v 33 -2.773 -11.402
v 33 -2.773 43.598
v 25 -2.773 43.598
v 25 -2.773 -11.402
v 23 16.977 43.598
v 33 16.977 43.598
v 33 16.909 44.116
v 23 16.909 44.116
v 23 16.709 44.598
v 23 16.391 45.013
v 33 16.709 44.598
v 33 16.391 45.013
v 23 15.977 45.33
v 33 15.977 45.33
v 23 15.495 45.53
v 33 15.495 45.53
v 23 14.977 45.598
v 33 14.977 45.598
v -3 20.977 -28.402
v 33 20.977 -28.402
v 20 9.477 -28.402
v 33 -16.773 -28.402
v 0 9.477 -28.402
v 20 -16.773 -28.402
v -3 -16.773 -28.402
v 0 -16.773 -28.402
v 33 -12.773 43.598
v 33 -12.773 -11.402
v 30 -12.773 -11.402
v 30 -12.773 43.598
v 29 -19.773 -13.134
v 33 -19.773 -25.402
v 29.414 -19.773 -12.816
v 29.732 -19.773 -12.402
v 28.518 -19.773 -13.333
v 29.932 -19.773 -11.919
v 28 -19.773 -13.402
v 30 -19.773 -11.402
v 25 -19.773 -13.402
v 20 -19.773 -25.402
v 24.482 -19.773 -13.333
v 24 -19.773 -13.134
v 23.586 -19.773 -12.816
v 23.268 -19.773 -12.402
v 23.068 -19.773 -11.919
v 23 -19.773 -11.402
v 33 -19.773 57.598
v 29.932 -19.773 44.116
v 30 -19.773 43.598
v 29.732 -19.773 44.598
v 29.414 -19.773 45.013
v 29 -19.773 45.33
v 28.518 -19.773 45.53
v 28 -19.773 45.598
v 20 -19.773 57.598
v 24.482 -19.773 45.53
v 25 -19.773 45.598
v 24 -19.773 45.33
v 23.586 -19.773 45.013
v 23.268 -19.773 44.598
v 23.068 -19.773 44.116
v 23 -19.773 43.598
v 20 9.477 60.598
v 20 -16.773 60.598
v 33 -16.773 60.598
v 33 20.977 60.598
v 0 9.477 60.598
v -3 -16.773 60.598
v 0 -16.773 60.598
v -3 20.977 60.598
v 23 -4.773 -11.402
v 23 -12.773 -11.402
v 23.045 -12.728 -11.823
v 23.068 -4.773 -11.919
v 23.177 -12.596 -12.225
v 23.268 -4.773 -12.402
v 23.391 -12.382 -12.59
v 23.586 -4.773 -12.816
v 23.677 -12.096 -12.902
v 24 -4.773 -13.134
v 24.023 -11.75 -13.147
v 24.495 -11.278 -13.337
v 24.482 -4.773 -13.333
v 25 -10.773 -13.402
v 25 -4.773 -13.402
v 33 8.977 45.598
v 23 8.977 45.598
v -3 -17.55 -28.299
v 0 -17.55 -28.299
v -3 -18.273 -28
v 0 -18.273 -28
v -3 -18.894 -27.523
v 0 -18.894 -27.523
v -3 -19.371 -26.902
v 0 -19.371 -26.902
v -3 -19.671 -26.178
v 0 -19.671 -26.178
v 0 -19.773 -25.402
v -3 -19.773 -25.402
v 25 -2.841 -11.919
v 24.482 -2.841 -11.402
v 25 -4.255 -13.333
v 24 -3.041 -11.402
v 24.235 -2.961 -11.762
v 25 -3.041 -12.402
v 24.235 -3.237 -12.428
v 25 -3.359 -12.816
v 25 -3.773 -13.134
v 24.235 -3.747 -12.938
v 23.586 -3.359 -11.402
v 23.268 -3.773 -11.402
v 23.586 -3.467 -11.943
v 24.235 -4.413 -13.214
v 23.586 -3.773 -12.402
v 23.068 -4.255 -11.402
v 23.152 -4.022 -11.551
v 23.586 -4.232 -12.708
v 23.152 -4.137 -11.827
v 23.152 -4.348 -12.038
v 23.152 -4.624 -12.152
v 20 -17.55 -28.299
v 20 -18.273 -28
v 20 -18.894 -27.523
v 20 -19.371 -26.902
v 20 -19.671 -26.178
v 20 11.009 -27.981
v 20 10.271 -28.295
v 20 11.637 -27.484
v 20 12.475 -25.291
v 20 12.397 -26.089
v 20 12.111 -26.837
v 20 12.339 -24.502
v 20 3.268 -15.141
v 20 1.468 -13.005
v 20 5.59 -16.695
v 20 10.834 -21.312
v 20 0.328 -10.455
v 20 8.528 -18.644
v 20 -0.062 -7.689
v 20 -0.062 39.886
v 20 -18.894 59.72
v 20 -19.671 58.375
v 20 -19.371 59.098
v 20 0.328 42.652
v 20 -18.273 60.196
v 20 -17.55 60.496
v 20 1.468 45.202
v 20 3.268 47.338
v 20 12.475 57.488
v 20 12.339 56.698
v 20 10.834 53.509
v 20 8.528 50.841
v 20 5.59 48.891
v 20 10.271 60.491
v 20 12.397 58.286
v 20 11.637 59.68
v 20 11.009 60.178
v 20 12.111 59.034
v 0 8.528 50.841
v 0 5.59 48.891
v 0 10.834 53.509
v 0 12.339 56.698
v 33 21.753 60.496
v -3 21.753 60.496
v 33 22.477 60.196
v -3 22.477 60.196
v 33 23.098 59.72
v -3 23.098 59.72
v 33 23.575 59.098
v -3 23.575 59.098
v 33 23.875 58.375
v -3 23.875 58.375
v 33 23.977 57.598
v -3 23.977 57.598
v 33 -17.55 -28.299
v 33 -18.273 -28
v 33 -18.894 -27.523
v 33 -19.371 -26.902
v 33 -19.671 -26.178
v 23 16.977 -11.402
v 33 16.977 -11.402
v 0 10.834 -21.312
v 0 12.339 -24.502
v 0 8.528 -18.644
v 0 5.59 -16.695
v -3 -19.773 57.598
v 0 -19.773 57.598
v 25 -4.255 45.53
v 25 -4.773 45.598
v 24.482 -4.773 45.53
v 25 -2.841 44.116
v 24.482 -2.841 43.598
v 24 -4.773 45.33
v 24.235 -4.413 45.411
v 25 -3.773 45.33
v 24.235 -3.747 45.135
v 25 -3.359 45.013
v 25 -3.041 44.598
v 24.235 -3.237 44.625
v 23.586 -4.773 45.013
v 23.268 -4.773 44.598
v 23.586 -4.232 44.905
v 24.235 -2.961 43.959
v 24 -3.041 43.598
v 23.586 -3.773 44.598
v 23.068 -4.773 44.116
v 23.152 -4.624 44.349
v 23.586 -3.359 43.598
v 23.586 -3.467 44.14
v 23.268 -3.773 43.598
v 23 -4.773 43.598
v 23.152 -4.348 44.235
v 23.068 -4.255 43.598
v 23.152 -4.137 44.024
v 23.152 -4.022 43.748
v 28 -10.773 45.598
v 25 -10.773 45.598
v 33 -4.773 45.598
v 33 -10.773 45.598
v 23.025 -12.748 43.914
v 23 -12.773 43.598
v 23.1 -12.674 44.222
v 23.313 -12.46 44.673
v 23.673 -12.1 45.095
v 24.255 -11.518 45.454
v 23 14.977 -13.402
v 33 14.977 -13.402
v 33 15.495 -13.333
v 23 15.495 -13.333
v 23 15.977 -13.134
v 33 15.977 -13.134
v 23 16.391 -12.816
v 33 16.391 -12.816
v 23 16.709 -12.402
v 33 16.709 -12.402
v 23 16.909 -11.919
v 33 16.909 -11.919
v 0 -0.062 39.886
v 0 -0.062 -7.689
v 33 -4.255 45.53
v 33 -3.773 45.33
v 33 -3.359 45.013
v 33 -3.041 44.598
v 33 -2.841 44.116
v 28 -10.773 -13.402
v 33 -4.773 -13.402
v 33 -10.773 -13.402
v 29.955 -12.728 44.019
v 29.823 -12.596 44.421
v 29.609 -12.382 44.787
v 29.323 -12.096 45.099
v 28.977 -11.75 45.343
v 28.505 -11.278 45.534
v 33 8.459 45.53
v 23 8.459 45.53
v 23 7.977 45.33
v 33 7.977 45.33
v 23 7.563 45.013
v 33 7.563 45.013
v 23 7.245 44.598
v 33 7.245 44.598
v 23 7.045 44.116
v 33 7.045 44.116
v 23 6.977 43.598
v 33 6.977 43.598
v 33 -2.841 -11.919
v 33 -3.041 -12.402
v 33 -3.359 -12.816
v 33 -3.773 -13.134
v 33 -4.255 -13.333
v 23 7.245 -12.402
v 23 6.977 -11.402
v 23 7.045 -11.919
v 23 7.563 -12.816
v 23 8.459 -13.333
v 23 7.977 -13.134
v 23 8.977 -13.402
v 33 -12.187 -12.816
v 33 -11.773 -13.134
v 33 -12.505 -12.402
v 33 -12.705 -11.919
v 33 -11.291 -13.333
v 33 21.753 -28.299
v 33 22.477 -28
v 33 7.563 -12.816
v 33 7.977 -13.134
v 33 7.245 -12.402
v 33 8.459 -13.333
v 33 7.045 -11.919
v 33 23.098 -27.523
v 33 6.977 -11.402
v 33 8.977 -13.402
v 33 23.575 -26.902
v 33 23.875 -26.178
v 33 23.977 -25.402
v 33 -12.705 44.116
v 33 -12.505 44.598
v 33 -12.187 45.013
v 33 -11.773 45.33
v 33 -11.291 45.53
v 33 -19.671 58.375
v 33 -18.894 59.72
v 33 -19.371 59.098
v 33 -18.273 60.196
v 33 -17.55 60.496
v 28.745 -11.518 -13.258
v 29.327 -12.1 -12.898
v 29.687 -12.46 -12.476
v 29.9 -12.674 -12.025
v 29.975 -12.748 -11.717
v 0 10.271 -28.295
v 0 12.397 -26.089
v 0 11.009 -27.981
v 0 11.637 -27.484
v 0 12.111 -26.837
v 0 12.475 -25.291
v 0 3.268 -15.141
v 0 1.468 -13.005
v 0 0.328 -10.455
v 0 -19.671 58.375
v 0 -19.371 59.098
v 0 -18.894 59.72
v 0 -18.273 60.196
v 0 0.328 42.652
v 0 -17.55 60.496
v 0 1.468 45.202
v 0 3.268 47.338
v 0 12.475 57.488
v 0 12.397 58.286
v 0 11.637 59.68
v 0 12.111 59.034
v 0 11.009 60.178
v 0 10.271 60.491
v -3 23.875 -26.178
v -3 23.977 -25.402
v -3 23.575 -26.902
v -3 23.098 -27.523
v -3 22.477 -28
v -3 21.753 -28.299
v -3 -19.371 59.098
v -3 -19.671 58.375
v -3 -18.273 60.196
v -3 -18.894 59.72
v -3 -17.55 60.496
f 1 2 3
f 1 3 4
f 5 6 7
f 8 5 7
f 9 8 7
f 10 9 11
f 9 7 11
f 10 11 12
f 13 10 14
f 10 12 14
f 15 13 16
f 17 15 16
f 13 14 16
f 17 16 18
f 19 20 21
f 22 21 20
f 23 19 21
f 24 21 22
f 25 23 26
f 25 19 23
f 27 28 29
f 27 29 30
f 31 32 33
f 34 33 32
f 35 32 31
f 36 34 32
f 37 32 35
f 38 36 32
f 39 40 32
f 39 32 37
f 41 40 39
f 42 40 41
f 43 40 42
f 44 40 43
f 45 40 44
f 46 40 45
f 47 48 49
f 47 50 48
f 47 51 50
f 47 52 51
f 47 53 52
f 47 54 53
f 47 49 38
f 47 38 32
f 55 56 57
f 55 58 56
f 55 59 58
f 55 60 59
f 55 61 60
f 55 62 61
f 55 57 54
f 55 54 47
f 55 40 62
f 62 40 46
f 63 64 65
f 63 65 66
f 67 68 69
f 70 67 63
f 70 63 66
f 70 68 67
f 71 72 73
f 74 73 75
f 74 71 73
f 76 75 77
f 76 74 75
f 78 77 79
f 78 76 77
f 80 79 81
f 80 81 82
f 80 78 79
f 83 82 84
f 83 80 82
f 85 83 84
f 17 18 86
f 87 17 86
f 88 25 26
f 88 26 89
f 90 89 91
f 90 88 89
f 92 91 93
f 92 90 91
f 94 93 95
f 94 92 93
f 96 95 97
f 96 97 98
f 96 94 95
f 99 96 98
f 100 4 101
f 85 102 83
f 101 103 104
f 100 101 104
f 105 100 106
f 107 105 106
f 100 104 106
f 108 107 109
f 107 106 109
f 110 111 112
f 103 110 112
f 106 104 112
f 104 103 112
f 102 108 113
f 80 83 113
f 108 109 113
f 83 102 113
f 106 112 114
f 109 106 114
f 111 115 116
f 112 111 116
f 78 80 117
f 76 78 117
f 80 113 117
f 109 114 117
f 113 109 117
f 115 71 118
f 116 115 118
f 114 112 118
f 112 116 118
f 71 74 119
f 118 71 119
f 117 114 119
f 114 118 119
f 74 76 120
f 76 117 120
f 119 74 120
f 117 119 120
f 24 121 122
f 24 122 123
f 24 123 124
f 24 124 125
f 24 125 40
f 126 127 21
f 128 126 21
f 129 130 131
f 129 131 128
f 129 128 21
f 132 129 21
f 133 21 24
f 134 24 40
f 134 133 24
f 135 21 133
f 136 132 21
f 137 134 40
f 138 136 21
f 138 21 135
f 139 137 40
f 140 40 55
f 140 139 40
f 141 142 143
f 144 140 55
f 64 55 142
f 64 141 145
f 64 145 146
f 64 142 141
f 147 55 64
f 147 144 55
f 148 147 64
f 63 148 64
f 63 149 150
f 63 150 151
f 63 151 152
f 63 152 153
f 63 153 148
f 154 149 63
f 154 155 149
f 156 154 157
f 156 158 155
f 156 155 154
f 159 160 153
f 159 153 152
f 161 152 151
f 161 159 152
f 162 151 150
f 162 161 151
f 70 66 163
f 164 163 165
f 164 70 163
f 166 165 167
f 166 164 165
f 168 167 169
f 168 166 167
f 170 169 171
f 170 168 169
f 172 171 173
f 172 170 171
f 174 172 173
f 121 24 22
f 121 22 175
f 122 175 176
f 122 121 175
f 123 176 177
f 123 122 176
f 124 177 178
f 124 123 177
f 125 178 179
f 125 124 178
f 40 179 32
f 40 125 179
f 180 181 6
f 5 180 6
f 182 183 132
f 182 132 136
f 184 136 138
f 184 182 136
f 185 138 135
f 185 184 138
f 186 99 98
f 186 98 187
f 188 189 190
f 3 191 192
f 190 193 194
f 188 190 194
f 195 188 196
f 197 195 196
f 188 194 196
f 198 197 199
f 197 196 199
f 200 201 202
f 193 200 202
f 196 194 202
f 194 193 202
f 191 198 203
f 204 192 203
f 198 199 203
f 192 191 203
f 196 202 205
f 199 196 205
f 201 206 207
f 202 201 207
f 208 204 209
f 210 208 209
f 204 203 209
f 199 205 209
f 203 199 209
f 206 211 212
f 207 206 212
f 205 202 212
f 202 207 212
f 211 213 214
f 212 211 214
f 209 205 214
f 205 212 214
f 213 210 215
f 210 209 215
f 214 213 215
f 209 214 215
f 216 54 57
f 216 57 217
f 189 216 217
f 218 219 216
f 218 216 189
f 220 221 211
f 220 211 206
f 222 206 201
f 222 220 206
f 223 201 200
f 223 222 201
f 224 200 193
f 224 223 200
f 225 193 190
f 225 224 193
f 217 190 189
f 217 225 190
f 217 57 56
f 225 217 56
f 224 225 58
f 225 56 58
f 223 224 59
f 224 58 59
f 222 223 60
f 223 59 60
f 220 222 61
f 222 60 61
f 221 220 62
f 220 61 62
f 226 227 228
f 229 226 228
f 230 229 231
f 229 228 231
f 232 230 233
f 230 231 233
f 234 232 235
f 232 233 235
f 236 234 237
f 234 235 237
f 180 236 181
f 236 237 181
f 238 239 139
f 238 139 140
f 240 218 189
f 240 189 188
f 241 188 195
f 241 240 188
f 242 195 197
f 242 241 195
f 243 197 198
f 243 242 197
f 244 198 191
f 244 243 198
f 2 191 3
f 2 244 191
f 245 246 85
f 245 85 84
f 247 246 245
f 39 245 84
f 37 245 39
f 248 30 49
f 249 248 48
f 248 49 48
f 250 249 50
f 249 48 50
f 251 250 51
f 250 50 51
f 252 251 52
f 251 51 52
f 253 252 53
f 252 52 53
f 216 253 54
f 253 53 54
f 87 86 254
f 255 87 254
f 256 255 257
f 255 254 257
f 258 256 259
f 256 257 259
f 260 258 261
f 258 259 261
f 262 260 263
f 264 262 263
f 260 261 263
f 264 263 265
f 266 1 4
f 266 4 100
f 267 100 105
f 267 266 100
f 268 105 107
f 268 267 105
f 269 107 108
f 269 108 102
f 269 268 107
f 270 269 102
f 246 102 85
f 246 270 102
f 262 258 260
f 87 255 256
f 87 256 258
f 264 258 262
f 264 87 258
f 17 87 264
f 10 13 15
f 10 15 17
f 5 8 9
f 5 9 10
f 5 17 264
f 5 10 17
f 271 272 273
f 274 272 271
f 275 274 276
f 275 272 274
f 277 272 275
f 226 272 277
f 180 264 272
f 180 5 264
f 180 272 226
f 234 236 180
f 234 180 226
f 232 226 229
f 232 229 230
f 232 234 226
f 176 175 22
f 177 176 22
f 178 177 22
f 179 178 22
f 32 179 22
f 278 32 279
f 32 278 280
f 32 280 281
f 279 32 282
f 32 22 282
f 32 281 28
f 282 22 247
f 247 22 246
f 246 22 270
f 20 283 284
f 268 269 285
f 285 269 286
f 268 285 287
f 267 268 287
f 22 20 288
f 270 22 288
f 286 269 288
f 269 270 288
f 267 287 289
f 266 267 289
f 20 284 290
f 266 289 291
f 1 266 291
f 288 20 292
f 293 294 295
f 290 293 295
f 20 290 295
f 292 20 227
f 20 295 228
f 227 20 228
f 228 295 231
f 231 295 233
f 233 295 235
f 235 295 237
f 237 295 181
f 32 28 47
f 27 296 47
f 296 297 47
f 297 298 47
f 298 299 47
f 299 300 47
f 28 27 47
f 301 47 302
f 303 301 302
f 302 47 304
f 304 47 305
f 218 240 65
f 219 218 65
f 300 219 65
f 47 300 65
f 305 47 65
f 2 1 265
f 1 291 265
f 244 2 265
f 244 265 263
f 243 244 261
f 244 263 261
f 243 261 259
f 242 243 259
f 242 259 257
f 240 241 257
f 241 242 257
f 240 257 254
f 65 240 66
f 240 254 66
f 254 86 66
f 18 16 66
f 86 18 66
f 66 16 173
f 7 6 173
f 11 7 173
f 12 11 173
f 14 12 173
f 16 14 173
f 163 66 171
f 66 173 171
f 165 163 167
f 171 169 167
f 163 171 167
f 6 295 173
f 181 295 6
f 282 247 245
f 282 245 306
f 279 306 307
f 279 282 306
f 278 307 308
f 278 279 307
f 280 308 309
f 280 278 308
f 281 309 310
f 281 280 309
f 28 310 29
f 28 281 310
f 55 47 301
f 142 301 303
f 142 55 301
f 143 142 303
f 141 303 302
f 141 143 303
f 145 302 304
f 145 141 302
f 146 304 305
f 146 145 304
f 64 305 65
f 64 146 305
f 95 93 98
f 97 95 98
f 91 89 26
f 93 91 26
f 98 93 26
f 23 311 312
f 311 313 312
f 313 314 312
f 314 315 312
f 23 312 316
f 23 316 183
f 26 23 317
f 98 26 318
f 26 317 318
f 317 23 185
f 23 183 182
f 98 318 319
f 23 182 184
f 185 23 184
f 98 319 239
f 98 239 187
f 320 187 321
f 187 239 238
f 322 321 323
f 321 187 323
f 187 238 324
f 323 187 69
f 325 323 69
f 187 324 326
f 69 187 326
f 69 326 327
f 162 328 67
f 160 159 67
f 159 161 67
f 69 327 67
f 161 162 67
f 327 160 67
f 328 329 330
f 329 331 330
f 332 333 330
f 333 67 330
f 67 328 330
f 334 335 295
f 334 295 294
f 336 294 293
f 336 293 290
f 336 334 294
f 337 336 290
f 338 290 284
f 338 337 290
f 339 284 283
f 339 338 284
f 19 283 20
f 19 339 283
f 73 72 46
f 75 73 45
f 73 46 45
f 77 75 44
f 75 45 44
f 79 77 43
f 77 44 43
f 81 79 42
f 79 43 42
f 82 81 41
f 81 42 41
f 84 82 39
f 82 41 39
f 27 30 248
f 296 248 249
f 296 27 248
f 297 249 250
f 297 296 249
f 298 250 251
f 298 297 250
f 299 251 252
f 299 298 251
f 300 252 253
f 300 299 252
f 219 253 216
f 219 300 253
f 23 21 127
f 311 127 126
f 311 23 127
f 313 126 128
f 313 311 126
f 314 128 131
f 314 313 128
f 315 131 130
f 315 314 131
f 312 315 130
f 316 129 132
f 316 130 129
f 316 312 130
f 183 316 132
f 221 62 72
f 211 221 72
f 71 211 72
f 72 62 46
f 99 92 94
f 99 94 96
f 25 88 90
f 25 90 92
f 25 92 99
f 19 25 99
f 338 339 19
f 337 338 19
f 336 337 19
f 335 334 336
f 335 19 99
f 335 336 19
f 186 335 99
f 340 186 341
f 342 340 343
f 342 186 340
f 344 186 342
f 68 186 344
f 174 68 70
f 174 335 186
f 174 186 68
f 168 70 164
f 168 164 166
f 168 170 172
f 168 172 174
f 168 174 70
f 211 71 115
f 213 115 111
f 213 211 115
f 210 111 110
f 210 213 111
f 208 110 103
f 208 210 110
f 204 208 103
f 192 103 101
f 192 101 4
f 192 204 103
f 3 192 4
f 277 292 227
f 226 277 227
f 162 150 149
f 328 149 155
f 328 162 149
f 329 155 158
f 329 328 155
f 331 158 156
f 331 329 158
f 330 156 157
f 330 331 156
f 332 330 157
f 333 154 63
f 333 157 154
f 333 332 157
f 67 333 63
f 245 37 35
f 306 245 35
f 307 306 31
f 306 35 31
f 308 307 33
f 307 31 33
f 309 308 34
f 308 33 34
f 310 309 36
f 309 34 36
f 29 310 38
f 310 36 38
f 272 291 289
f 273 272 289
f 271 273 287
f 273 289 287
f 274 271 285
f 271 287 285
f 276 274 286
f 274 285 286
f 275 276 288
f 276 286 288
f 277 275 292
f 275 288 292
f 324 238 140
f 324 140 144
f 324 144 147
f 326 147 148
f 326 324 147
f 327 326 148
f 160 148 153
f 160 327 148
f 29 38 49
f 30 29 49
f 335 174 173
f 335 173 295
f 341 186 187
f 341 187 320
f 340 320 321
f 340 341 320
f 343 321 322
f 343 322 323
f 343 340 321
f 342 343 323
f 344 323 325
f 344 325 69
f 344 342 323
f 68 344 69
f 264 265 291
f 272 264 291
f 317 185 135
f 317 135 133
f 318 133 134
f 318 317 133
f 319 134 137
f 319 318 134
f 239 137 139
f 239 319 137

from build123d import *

# Parameters (mm, degrees)
RESSALTO_EXTRUS_O2_DEPTH      = 30
RESSALTO_EXTRUS_O3_START      = 3
RESSALTO_EXTRUS_O3_DEPTH      = 3
RESSALTO_EXTRUS_O4_DEPTH      = 3
RESSALTO_EXTRUS_O4_DEPTH_BACK = 10
CORTE_EXTRUS_O1_DEPTH         = 10.000000000000002
CORTE_EXTRUS_O2_REACH         = 83.702
FILETE1_R                     = 2


with BuildPart() as part:
    # Esboço2 → Ressalto-extrusão2 (new body)
    with BuildSketch(Plane(origin=(0, 0, 0), x_dir=(0, 0, -1), z_dir=(1, 0, 0))):
        with BuildLine():
            Line((2.901599919865161, -0.06246593766177921), (-35.09840008013481, -0.06246593766176534))
            Line((-35.09840008013481, -0.06246593766176534), (-39.886084902926825, -0.06246593766177921))
            ThreePointArc((-39.886084902926825, -0.06246593766177921), (-45.20218023363878, 1.4676385237390175), (-48.891439327799866, 5.589707975381692))
            ThreePointArc((-48.891439327799866, 5.589707975381692), (-52.09653694789475, 9.772081498832542), (-56.69840008013493, 12.338743680758546))
            ThreePointArc((-56.69840008013493, 12.338743680758546), (-59.37322401506481, 11.895603400997262), (-60.5984000801349, 9.476926076507686))
            Line((-60.5984000801349, 9.476926076507686), (-60.598400080134894, 20.976926076507663))
            ThreePointArc((-60.598400080134894, 20.976926076507663), (-59.71972042369454, 23.098246420067323), (-57.59840008013488, 23.976926076507684))
            Line((-57.59840008013488, 23.976926076507684), (25.401599919865156, 23.976926076507684))
            ThreePointArc((25.401599919865156, 23.976926076507684), (27.522920263424812, 23.098246420067333), (28.401599919865177, 20.976926076507684))
            Line((28.401599919865177, 20.976926076507684), (28.40159991986526, 9.476926076507686))
            ThreePointArc((28.40159991986526, 9.476926076507686), (27.176423854795164, 11.895603400997262), (24.50159991986529, 12.338743680758546))
            ThreePointArc((24.50159991986529, 12.338743680758546), (19.8997367876251, 9.772081498832549), (16.69463916753021, 5.589707975381692))
            ThreePointArc((16.69463916753021, 5.589707975381692), (13.005380073369123, 1.467638523739021), (7.689284742657176, -0.06246593766177921))
            Line((7.689284742657176, -0.06246593766177921), (2.901599919865161, -0.06246593766177921))
        make_face()
    extrude(amount=RESSALTO_EXTRUS_O2_DEPTH)

    # Esboço3 → Ressalto-extrusão3 (add)
    with BuildSketch(Plane.ZY.offset(RESSALTO_EXTRUS_O3_START)):
        with BuildLine():
            Line((60.598400080134894, 15.226926076507677), (60.59840008013489, 20.976926076507663))
            ThreePointArc((60.59840008013489, 20.976926076507663), (59.71972042369454, 23.098246420067326), (57.59840008013487, 23.976926076507684))
            Line((57.59840008013487, 23.976926076507684), (16.09840008013486, 23.976926076507684))
            Line((16.09840008013486, 23.976926076507684), (-25.4015999198652, 23.976926076507684))
            ThreePointArc((-25.4015999198652, 23.976926076507684), (-27.52292026342486, 23.098246420067326), (-28.40159991986522, 20.976926076507663))
            Line((-28.40159991986522, 20.976926076507663), (-28.40159991986522, 15.226926076507686))
            Line((-28.40159991986522, 15.226926076507686), (-28.40159991986525, -16.773073923492294))
            ThreePointArc((-28.40159991986525, -16.773073923492294), (-27.522920263424897, -18.894394267051958), (-25.401599919865234, -19.77307392349232))
            Line((-25.401599919865234, -19.77307392349232), (57.59840008013488, -19.773073923492326))
            ThreePointArc((57.59840008013488, -19.773073923492326), (59.71972042369455, -18.89439426705197), (60.5984000801349, -16.7730739234923))
            Line((60.5984000801349, -16.7730739234923), (60.598400080134894, 15.226926076507677))
        make_face()
    extrude(amount=-RESSALTO_EXTRUS_O3_DEPTH)

    # Esboço4 → Ressalto-extrusão4 (add, two sides: drawn at the far end of the back side and taken through both)
    with BuildSketch(Plane(origin=(30, 0, 0), x_dir=(0, 0, -1), z_dir=(1, 0, 0)).offset(-RESSALTO_EXTRUS_O4_DEPTH_BACK)):
        with BuildLine():
            Line((-16.09840008013486, 23.976926076507684), (25.4015999198652, 23.976926076507684))
            ThreePointArc((25.4015999198652, 23.976926076507684), (27.52292026342486, 23.098246420067326), (28.40159991986522, 20.976926076507663))
            Line((28.40159991986522, 20.976926076507663), (28.40159991986522, 15.226926076507686))
            Line((28.40159991986522, 15.226926076507686), (28.40159991986523, -16.773073923492294))
            ThreePointArc((28.40159991986523, -16.773073923492294), (27.522920263424872, -18.89439426705196), (25.401599919865205, -19.77307392349232))
            Line((25.401599919865205, -19.77307392349232), (-57.598400080134866, -19.773073923492326))
            ThreePointArc((-57.598400080134866, -19.773073923492326), (-59.71972042369453, -18.89439426705197), (-60.59840008013489, -16.773073923492305))
            Line((-60.59840008013489, -16.773073923492305), (-60.598400080134894, 15.226926076507677))
            Line((-60.598400080134894, 15.226926076507677), (-60.598400080134894, 20.976926076507663))
            ThreePointArc((-60.598400080134894, 20.976926076507663), (-59.71972042369454, 23.098246420067326), (-57.59840008013487, 23.976926076507684))
            Line((-57.59840008013487, 23.976926076507684), (-16.09840008013486, 23.976926076507684))
        make_face()
    extrude(amount=RESSALTO_EXTRUS_O4_DEPTH + RESSALTO_EXTRUS_O4_DEPTH_BACK)

    # Esboço8 → Corte-extrusão1 (cut)
    with BuildSketch(Plane(origin=(33, 0, 0), x_dir=(0, 0, -1), z_dir=(1, 0, 0))):
        with BuildLine():
            Line((-43.59840008013488, -2.7730739234923267), (11.401599919865212, -2.7730739234923267))
            ThreePointArc((11.401599919865212, -2.7730739234923267), (12.815813482238323, -3.3588603611192323), (13.401599919865227, -4.7730739234923405))
            Line((13.401599919865227, -4.7730739234923405), (13.401599919865227, -10.773073923492314))
            ThreePointArc((13.401599919865227, -10.773073923492314), (12.81581348223832, -12.187287485865422), (11.401599919865212, -12.773073923492326))
            Line((11.401599919865212, -12.773073923492326), (-43.59840008013488, -12.773073923492326))
            ThreePointArc((-43.59840008013488, -12.773073923492326), (-45.012613642507986, -12.187287485865422), (-45.598400080134894, -10.773073923492314))
            Line((-45.598400080134894, -10.773073923492314), (-45.598400080134894, -4.7730739234923405))
            ThreePointArc((-45.598400080134894, -4.7730739234923405), (-45.012613642507986, -3.358860361119232), (-43.59840008013488, -2.7730739234923267))
        make_face()
        with BuildLine():
            Line((-43.59840008013488, 6.976926076507685), (11.401599919865218, 6.976926076507685))
            ThreePointArc((11.401599919865218, 6.976926076507685), (12.815813482238326, 7.56271251413459), (13.401599919865228, 8.976926076507699))
            Line((13.401599919865228, 8.976926076507699), (13.401599919865227, 14.976926076507674))
            ThreePointArc((13.401599919865227, 14.976926076507674), (12.81581348223832, 16.39113963888078), (11.401599919865214, 16.976926076507684))
            Line((11.401599919865214, 16.976926076507684), (-43.59840008013488, 16.976926076507684))
            ThreePointArc((-43.59840008013488, 16.976926076507684), (-45.012613642507986, 16.39113963888078), (-45.598400080134894, 14.976926076507672))
            Line((-45.598400080134894, 14.976926076507672), (-45.598400080134894, 8.976926076507699))
            ThreePointArc((-45.598400080134894, 8.976926076507699), (-45.012613642507986, 7.5627125141345894), (-43.59840008013488, 6.976926076507685))
        make_face()
    extrude(amount=-CORTE_EXTRUS_O1_DEPTH, mode=Mode.SUBTRACT)

    # Esboço9 → Corte-extrusão2 (cut, up to next)
    with BuildSketch(Plane(origin=(0, -19.773073923492323, -1.65e-15), x_dir=(-1, 0, 0), z_dir=(0, -1, -8e-17)), mode=Mode.PRIVATE) as corte_extrus_o2_sk1:
        with BuildLine():
            Line((-25.000000000000007, 13.401599919865228), (-27.99999999999999, 13.401599919865228))
            ThreePointArc((-27.99999999999999, 13.401599919865228), (-29.414213562373096, 12.815813482238323), (-30.000000000000004, 11.401599919865216))
            Line((-30.000000000000004, 11.401599919865216), (-29.999999999999996, -43.59840008013487))
            ThreePointArc((-29.999999999999996, -43.59840008013487), (-29.414213562373092, -45.01261364250798), (-27.999999999999982, -45.59840008013489))
            Line((-27.999999999999982, -45.59840008013489), (-25, -45.59840008013489))
            ThreePointArc((-25, -45.59840008013489), (-23.585786437626894, -45.01261364250798), (-22.99999999999999, -43.59840008013487))
            Line((-22.99999999999999, -43.59840008013487), (-22.999999999999996, 11.401599919865216))
            ThreePointArc((-22.999999999999996, 11.401599919865216), (-23.585786437626897, 12.815813482238324), (-25.000000000000007, 13.401599919865228))
        make_face()
    corte_extrus_o2_tool1 = extrude(corte_extrus_o2_sk1.sketch, amount=-CORTE_EXTRUS_O2_REACH, mode=Mode.PRIVATE) & part.part
    add(corte_extrus_o2_tool1.solids().sort_by_distance((26.5, -19.773074, 16.0984))[0], mode=Mode.SUBTRACT)

    # Filete1
    # the kernel refuses this fillet: 2 mm, written as the material it adds along each edge
    with BuildSketch(Plane(origin=(22.99999999999999, -15.773073923492316, 45.59840008013489), x_dir=(0, 0, -1), z_dir=(0, 1, 0))) as filete1_piece_1:
        with BuildLine():
            CenterArc((FILETE1_R, -FILETE1_R), FILETE1_R, 90, 90)
            Line((0, -FILETE1_R), (0, 0))
            Line((0, 0), (FILETE1_R, 0))
        make_face()
    extrude(amount=10.999999999999973)
    with BuildSketch(Plane(origin=(23, -4.773073923492332, 43.59840008013489), x_dir=(0, -4.44e-15, 1), z_dir=(0, -1, -4.44e-15))) as filete1_piece_2:
        with BuildLine():
            CenterArc((2.000000000000007 - FILETE1_R, -FILETE1_R), FILETE1_R, 359.9999999999997, 90.00000000000028)
            Line((2.000000000000007, -FILETE1_R), (2.000000000000007, 0))
            Line((2.000000000000007, 0), (2.000000000000007 - FILETE1_R, 1.066e-14))
        make_face()
    revolve(axis=Axis((23, -4.773073923492332, 43.59840008013489), (-1, 0, 0)), revolution_arc=90.00000000000045)
    with BuildSketch(Plane(origin=(23, -2.7730739234923267, 43.59840008013488), x_dir=(-5.33e-15, -1, 0), z_dir=(0, 0, -1))) as filete1_piece_3:
        with BuildLine():
            CenterArc((FILETE1_R, -FILETE1_R), FILETE1_R, 89.99999999999969, 90.00000000000031)
            Line((-1.11e-14, -FILETE1_R), (0, 0))
            Line((0, 0), (FILETE1_R, 0))
        make_face()
    extrude(amount=55.00000000000009)
    with BuildSketch(Plane(origin=(23, -4.773073923492328, -11.401599919865227), x_dir=(0, 1, 7.11e-15), z_dir=(0, -7.11e-15, 1))) as filete1_piece_4:
        with BuildLine():
            CenterArc((2.0000000000000004 - FILETE1_R, -FILETE1_R), FILETE1_R, 359.9999999999999, 90.00000000000011)
            Line((2.0000000000000018, -FILETE1_R), (2.0000000000000004, 0))
            Line((2.0000000000000004, 0), (2.0000000000000004 - FILETE1_R, 3.55e-15))
        make_face()
    revolve(axis=Axis((23, -4.773073923492328, -11.401599919865227), (-1, 0, 0)), revolution_arc=90.00000000000077)
    with BuildSketch(Plane(origin=(23, -4.7730739234923405, -13.401599919865227), x_dir=(-1.78e-15, 0, 1), z_dir=(0, -1, 0))) as filete1_piece_5:
        with BuildLine():
            CenterArc((FILETE1_R, -FILETE1_R), FILETE1_R, 89.9999999999999, 90.0000000000001)
            Line((-3.55e-15, -FILETE1_R), (0, 0))
            Line((0, 0), (FILETE1_R, 0))
        make_face()
    extrude(amount=10.999999999999973)


solid = part.part
